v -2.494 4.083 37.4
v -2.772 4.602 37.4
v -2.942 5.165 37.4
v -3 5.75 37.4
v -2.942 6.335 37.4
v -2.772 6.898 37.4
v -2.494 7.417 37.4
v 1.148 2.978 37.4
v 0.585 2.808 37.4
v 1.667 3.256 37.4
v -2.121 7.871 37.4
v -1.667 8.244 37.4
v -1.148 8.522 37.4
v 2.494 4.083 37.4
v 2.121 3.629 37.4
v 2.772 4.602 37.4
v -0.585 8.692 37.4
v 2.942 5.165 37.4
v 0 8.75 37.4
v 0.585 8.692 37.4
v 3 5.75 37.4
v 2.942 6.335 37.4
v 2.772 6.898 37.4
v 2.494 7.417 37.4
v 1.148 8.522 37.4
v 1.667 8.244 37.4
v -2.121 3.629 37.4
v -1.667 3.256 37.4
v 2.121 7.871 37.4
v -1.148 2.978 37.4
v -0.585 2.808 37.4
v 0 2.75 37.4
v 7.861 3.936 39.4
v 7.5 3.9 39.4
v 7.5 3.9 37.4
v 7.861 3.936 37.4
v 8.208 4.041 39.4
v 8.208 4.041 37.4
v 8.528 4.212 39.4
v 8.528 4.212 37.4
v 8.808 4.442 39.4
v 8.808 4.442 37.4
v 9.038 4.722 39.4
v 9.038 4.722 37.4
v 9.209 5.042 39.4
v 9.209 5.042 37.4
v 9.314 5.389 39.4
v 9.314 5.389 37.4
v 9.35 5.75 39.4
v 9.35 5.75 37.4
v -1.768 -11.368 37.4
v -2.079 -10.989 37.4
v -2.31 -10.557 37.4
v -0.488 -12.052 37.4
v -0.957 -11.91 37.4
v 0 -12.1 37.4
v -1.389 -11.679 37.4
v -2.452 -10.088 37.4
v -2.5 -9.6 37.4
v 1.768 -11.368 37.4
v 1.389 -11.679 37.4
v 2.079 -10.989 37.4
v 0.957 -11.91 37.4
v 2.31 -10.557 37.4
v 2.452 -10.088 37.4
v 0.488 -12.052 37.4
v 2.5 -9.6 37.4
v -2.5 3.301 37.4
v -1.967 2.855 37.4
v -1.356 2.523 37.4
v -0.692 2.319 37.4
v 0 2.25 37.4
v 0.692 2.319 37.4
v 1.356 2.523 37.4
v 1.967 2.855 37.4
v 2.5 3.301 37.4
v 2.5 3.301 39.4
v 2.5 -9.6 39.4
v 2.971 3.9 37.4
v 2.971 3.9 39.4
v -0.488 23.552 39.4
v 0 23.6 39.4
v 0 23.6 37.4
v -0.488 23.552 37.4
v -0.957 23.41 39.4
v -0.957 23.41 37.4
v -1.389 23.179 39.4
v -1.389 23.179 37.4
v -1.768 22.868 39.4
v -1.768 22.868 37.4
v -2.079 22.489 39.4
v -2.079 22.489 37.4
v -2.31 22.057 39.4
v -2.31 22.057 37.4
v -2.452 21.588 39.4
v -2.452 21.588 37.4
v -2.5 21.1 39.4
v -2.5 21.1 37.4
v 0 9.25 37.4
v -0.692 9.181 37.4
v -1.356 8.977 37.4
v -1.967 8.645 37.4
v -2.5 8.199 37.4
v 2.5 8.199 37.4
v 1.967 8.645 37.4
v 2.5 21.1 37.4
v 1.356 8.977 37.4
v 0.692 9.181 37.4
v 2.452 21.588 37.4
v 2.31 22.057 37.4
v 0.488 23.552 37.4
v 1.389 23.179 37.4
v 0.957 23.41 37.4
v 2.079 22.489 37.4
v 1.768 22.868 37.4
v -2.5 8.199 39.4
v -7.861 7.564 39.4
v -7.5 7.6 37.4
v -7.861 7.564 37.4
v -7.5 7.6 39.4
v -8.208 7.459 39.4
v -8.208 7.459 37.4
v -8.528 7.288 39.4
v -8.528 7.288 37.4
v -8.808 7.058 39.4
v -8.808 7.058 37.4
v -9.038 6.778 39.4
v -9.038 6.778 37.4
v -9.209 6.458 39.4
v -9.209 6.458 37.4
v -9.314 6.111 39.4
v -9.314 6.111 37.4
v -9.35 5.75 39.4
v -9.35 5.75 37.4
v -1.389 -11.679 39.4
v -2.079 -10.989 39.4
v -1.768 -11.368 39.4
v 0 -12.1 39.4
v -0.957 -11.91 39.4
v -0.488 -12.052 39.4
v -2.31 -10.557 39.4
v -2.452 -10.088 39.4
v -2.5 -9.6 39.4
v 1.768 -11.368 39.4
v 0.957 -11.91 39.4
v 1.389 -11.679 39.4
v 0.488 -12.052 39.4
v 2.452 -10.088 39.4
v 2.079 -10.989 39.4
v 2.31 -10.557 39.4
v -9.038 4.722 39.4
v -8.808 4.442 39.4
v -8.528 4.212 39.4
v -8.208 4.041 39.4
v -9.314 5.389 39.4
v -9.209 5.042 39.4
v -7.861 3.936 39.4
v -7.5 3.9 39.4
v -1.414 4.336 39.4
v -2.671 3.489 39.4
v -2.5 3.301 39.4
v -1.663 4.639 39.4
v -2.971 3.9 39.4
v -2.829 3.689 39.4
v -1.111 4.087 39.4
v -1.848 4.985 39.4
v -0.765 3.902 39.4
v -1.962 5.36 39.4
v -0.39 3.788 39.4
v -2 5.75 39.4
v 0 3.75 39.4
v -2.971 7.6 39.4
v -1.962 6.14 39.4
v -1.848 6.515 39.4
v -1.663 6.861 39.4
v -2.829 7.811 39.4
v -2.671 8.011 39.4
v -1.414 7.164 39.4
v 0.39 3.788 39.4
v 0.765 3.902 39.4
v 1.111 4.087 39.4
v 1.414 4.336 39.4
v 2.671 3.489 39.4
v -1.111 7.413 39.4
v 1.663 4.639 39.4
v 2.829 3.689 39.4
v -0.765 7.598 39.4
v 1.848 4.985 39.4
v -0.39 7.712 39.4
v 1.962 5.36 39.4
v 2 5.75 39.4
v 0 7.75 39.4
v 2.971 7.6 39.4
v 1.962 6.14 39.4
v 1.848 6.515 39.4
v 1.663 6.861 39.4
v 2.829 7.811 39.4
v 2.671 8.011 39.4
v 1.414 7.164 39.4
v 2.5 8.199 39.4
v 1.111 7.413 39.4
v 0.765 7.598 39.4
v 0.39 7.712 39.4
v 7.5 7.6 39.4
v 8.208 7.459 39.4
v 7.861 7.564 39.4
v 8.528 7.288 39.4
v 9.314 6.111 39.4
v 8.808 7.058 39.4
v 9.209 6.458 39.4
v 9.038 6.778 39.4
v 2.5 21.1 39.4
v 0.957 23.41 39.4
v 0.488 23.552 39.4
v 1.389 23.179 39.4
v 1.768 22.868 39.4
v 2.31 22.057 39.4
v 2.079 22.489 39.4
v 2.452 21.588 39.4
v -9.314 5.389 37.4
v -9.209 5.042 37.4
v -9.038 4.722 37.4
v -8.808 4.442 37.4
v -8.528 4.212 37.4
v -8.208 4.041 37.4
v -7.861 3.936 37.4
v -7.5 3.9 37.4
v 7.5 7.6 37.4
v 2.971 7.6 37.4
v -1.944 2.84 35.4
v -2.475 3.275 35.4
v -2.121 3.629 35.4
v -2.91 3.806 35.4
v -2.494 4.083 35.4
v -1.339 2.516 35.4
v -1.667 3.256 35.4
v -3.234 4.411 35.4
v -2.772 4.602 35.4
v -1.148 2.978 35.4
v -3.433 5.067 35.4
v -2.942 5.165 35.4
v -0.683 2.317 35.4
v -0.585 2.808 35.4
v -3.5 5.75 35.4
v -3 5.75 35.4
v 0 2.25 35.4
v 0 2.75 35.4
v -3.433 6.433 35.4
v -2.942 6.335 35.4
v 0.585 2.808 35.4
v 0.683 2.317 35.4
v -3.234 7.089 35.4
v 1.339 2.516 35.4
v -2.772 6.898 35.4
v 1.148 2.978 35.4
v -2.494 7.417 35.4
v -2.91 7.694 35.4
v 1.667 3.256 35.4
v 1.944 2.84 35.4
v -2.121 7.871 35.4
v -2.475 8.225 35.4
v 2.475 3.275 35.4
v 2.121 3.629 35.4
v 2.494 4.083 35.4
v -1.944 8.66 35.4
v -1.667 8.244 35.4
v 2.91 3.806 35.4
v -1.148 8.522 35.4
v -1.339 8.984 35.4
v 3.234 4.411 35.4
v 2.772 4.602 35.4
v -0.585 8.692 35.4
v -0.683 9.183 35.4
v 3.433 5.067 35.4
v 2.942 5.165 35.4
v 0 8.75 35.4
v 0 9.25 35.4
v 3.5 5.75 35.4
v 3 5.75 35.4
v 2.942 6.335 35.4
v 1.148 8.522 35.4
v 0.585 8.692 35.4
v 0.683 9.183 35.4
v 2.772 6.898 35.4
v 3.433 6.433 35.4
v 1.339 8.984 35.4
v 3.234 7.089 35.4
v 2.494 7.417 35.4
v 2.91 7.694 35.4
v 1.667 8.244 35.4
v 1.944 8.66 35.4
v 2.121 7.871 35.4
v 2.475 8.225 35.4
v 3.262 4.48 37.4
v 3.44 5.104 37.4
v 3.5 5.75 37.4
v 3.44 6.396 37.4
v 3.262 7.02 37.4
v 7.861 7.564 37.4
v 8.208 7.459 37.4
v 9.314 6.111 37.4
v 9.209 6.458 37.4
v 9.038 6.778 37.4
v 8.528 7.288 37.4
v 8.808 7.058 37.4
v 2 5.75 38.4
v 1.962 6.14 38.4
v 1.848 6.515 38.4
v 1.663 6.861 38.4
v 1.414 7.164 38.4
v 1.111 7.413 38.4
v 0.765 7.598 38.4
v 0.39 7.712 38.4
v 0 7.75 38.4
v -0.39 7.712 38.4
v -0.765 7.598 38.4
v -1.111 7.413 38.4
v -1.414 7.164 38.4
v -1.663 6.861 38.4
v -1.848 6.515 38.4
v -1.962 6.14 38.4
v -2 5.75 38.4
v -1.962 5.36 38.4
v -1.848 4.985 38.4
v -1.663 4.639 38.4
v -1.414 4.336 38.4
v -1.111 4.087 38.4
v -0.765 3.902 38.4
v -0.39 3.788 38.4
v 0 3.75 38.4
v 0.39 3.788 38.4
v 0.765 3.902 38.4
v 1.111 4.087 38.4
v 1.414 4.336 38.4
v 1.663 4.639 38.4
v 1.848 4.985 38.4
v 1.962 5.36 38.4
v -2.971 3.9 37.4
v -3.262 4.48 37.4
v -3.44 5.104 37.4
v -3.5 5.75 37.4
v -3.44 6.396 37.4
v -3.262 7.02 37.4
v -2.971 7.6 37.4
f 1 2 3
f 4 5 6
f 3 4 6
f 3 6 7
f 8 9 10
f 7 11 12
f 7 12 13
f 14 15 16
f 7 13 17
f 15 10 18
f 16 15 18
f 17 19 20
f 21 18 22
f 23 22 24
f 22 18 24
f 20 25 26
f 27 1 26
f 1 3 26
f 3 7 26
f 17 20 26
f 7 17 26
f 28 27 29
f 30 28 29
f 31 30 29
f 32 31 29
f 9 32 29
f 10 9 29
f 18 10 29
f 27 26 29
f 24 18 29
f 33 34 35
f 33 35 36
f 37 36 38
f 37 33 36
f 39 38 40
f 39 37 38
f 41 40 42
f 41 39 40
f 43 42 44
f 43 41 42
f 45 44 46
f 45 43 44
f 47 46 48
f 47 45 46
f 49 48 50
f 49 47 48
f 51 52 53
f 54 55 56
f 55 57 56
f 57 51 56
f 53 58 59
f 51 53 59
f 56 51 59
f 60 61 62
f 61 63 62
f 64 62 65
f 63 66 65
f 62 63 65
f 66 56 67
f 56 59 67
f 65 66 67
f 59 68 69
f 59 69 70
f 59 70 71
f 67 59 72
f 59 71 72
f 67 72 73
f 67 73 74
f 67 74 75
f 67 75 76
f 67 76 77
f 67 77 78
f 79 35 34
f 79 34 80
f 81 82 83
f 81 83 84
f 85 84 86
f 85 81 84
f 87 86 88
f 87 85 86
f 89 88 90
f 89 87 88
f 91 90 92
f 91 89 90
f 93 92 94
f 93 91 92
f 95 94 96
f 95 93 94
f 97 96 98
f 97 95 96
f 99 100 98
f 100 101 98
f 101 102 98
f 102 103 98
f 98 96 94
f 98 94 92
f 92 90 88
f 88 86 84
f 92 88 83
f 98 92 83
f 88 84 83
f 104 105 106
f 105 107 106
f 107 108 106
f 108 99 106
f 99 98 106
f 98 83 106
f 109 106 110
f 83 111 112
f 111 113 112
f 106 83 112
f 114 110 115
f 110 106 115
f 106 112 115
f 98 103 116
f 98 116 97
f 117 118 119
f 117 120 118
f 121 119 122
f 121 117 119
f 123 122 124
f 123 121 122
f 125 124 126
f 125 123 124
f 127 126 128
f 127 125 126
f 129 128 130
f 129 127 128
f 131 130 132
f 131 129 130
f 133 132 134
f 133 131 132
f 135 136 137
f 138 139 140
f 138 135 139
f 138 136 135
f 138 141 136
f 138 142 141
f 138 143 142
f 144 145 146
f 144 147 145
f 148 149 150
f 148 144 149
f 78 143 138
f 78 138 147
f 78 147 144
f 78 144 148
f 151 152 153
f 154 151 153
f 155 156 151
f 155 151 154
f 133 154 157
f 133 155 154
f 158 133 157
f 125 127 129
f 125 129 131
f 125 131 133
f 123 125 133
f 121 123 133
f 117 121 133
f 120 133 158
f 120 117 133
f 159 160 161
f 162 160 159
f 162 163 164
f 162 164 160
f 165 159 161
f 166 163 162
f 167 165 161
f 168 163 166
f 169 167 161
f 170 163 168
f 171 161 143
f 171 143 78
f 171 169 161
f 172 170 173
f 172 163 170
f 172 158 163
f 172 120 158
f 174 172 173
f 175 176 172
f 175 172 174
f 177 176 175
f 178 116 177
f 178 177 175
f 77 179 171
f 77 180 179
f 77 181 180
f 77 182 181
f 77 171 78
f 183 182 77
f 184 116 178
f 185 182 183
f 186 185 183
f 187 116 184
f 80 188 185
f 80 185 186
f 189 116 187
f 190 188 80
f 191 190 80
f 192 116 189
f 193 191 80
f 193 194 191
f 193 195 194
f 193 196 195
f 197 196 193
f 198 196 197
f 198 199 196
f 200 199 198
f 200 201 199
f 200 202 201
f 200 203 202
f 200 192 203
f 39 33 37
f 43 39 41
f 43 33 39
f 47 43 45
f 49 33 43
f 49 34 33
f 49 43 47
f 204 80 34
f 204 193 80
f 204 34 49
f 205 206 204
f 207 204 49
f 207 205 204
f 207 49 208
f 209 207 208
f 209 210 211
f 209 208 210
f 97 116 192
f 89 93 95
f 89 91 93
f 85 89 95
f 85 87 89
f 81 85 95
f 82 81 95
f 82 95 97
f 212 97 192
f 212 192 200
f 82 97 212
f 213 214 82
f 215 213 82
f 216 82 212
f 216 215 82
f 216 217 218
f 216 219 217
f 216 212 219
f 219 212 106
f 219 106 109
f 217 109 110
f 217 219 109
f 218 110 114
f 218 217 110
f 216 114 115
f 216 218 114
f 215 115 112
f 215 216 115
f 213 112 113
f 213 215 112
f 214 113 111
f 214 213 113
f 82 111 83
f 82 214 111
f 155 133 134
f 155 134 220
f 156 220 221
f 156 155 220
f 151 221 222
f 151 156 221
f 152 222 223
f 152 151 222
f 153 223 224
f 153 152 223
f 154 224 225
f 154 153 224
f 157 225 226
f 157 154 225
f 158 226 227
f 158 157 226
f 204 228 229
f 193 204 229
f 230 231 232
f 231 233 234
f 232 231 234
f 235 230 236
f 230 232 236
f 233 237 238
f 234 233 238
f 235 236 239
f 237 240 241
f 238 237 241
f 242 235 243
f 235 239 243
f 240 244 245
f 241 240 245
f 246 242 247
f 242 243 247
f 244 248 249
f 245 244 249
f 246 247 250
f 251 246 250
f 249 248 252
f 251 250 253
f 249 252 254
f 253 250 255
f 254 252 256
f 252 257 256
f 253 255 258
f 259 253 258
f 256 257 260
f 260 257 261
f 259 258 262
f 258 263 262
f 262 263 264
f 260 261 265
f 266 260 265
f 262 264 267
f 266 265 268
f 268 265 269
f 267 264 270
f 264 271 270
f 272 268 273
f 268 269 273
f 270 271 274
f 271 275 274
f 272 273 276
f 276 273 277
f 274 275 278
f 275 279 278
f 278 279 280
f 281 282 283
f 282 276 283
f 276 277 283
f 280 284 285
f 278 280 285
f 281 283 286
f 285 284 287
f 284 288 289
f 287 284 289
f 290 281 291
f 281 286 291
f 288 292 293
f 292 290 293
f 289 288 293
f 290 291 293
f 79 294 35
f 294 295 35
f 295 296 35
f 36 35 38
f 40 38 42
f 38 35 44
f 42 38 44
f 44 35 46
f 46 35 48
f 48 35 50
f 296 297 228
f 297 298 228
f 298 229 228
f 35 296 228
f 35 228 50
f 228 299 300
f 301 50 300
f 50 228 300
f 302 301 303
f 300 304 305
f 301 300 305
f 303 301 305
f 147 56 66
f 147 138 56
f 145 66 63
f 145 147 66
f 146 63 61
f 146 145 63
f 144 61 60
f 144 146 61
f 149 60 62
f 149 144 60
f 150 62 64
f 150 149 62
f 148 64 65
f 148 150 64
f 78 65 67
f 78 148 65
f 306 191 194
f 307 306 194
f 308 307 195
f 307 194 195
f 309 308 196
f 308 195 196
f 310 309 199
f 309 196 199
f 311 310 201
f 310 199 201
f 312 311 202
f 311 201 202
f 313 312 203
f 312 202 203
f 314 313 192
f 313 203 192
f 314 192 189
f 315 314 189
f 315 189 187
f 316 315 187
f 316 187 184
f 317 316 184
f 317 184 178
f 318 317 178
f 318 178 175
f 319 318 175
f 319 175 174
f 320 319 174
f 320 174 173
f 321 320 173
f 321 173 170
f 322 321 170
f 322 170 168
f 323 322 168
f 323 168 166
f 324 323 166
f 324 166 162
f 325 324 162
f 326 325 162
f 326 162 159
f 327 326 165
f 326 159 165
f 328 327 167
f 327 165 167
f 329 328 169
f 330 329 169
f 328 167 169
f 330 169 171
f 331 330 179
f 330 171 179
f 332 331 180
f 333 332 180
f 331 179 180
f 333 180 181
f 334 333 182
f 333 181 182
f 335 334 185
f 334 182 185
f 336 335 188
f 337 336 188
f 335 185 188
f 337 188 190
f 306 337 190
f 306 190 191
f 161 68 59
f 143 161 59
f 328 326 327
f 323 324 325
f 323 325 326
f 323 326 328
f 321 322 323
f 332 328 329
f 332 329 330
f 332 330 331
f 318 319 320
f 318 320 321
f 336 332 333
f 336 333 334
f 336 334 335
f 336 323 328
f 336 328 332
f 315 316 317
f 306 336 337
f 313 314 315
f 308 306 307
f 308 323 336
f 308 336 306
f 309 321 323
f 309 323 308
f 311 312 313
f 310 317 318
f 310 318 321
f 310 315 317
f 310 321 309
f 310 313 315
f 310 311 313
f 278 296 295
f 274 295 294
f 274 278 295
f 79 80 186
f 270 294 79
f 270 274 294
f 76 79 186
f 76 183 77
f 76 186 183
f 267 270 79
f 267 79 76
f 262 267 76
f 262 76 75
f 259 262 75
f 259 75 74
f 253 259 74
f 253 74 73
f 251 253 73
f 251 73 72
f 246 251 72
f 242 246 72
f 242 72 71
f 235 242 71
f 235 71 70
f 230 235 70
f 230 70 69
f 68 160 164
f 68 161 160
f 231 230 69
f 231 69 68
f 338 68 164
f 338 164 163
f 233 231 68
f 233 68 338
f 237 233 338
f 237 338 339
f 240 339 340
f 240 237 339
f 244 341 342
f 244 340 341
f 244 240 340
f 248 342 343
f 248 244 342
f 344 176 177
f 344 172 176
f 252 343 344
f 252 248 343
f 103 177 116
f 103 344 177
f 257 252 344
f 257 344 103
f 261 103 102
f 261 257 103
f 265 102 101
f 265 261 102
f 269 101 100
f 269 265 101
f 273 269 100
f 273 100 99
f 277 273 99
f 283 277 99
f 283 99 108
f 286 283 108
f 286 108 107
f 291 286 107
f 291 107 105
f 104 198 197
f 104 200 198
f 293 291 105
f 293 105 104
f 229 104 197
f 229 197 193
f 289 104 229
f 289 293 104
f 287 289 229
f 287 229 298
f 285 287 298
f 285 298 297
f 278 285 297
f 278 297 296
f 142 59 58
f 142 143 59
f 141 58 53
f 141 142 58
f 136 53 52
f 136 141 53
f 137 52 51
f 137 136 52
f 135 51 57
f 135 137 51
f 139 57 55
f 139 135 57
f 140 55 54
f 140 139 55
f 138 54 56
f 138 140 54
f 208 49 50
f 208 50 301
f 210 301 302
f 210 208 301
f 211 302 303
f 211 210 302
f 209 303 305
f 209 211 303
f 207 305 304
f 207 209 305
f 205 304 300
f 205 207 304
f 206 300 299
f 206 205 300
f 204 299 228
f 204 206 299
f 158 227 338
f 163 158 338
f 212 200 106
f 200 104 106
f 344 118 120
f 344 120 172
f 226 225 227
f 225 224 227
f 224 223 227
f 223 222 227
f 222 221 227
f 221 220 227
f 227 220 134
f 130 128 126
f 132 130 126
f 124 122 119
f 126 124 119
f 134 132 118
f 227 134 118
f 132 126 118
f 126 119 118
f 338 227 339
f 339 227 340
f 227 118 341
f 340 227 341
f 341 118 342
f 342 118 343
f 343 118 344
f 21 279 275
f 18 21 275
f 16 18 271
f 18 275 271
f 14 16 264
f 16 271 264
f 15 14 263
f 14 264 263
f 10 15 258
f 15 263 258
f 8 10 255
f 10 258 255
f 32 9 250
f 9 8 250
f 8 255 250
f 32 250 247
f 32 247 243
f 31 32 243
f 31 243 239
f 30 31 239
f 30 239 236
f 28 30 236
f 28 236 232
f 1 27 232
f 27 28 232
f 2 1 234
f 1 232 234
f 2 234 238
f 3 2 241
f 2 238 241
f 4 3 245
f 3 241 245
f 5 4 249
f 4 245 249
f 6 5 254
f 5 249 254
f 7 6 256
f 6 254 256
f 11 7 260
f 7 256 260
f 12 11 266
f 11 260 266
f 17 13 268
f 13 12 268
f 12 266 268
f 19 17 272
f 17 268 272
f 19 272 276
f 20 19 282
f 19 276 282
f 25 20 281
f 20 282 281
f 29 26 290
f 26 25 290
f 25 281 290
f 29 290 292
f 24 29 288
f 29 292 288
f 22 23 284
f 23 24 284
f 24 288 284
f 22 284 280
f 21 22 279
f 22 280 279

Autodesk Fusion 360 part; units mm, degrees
sketch "Esquisse1" plane through (0, 0, 0) normal (0, 1, 0) x (1, 0, 0)
  circle A0 centre (0, 0) radius 35
  dimension "d1" = 70
sketch "Esquisse2" plane through (0, 0, 0) normal (0, 1, 0) x (1, 0, 0)
  circle A0 centre (0, 0) radius 32.5
  circle A1 centre (0, 0) radius 35
  dimension "d2" = 65
  dimension "d3" = 70
sketch "Esquisse3" plane through (0, 0, 35.4) normal (0, 0, 1) x (1, 0, 0)
  circle A0 centre (0, 5.75) radius 5.75
  circle A1 centre (0, 5.75) radius 5.75 construction
  circle A2 centre (0, 5.75) radius 3.5
  circle A3 centre (0, 5.75) radius 3
  dimension "d6" = 7
  dimension "d7" = 6
extrude "Extrusion2" add sketch "Esquisse3" along normal blind 2 contours A2 makes body 1
sketch "Esquisse4" plane through (0, 0, 37.4) normal (0, 0, 1) x (1, 0, 0)
  circle A0 centre (0, 5.75) radius 3
  circle A1 centre (0, 5.75) radius 3.5
  line L0 (0, 5.75) -> (0, 23.6) construction
  line L1 (0, 5.75) -> (0, -12.1) construction
  line L2 (0, 23.6) -> (6, 23.6) construction
  line L3 (0, 23.6) -> (-6, 23.6) construction
  line L4 (0, 5.75) -> (-2.5, 5.75)
  line L5 (-2.5, 5.75) -> (-2.5, 23.6)
  line L6 (-2.5, 23.6) -> (0, 23.6)
  line L7 (0, 23.6) -> (0, 5.75)
  line L8 (0, 5.75) -> (2.5, 5.75)
  line L9 (0, 23.6) -> (0, 5.75)
  line L10 (2.5, 5.75) -> (2.5, 23.6)
  line L11 (2.5, 23.6) -> (0, 23.6)
  line L12 (-2.5, 5.75) -> (-2.5, -12.1)
  line L13 (-2.5, -12.1) -> (0, -12.1)
  line L14 (2.5, -12.1) -> (0, -12.1)
  line L15 (2.5, 5.75) -> (2.5, -12.1)
  line L16 (0, 5.75) -> (2.5, 5.75)
  line L17 (0, 5.75) -> (-2.5, 5.75)
  line L18 (0, -12.1) -> (0, 5.75)
  line L19 (0, 5.75) -> (-9.35, 5.75) construction
  line L20 (0, 5.75) -> (9.35, 5.75) construction
  line L21 (-9.35, 5.75) -> (-9.35, 6) construction
  line L22 (-9.35, 6) -> (-9.35, 10) construction
  line L23 (-9.35, 5.75) -> (-9.35, 1.75) construction
  line L24 (9.35, 6) -> (9.35, 10) construction
  line L25 (9.35, 5.75) -> (9.35, 1.75) construction
  line L26 (0, 5.75) -> (-9.35, 5.75)
  line L27 (-9.35, 5.75) -> (-9.35, 3.9)
  line L28 (-9.35, 3.9) -> (0, 3.9)
  line L29 (0, 3.9) -> (0, 5.75)
  line L30 (-9.35, 7.6) -> (0, 7.6)
  line L31 (-9.35, 5.75) -> (-9.35, 7.6)
  line L32 (9.35, 7.6) -> (0, 7.6)
  line L33 (9.35, 5.75) -> (9.35, 7.6)
  line L34 (9.35, 5.75) -> (9.35, 3.9)
  line L35 (9.35, 3.9) -> (0, 3.9)
  line L36 (0, 5.75) -> (9.35, 5.75)
  dimension "d10" = 17.85
  dimension "d11" = 17.85
  dimension "d12" = 2.5
  dimension "d13" = 9.35
  dimension "d14" = 9.35
  dimension "d15" = 4
  dimension "d16" = 1.85
extrude "Extrusion3" add sketch "Esquisse4" along normal blind 2 bodies 1
fillet "Congé1" radius 2.5 4 edges at (-2.5, 23.6, 38.4) (2.5, 23.6, 38.4) (-2.5, -12.1, 38.4) (2.5, -12.1, 38.4) on bodies 1
fillet "Congé2" radius 1.85 4 edges at (-9.35, 7.6, 38.4) (-9.35, 3.9, 38.4) (9.35, 7.6, 38.4) (9.35, 3.9, 38.4) on bodies 1
sketch "Esquisse6" plane through (0, 0, 39.4) normal (0, 0, 1) x (1, 0, 0)
  arc A0 (7.5, 3.9) -> (7.5, 7.6) centre (7.5, 5.75) ccw
  line L0 (7.5, 7.6) -> (2.9711, 7.6)
  arc A1 (2.9711, 7.6) -> (2.5, 8.1995) centre (0, 5.75) ccw
  line L1 (2.5, 8.1995) -> (2.5, 21.1)
  arc A2 (2.5, 21.1) -> (-2.5, 21.1) centre (0, 21.1) ccw
  line L2 (-2.5, 21.1) -> (-2.5, 8.1995)
  arc A3 (-2.5, 8.1995) -> (-2.9711, 7.6) centre (0, 5.75) ccw
  line L3 (-2.9711, 7.6) -> (-7.5, 7.6)
  arc A4 (-7.5, 7.6) -> (-7.5, 3.9) centre (-7.5, 5.75) ccw
  line L4 (-7.5, 3.9) -> (-2.9711, 3.9)
  arc A5 (-2.9711, 3.9) -> (-2.5, 3.3005) centre (0, 5.75) ccw
  line L5 (-2.5, 3.3005) -> (-2.5, -9.6)
  arc A6 (-2.5, -9.6) -> (2.5, -9.6) centre (0, -9.6) ccw
  line L6 (2.5, -9.6) -> (2.5, 3.3005)
  arc A7 (2.5, 3.3005) -> (2.9711, 3.9) centre (0, 5.75) ccw
  line L7 (2.9711, 3.9) -> (7.5, 3.9)
  circle A8 centre (0, 5.75) radius 2
  dimension "d23" = 4
extrude "Extrusion4" cut sketch "Esquisse6" against normal blind 1 contours A8 bodies 1
copy_body "Corps->Comp1" bodies 1 removing the originals makes body 2 in component "servo_arm"
component "servo_arm" placed x (1, 0, 0) y (0, 1, 0) z (0, 0, 1) at (0, 0, 0)
equation "d10 = ( 35.7 / 2 ) * 1 mm"
equation "d11 = ( 35.7 / 2 ) * 1 mm"
equation "d13 = ( 18.7 / 2 ) * 1 mm"
equation "d14 = ( 18.7 / 2 ) * 1 mm"
equation "d16 = ( 3.7 / 2 ) * 1 mm"
